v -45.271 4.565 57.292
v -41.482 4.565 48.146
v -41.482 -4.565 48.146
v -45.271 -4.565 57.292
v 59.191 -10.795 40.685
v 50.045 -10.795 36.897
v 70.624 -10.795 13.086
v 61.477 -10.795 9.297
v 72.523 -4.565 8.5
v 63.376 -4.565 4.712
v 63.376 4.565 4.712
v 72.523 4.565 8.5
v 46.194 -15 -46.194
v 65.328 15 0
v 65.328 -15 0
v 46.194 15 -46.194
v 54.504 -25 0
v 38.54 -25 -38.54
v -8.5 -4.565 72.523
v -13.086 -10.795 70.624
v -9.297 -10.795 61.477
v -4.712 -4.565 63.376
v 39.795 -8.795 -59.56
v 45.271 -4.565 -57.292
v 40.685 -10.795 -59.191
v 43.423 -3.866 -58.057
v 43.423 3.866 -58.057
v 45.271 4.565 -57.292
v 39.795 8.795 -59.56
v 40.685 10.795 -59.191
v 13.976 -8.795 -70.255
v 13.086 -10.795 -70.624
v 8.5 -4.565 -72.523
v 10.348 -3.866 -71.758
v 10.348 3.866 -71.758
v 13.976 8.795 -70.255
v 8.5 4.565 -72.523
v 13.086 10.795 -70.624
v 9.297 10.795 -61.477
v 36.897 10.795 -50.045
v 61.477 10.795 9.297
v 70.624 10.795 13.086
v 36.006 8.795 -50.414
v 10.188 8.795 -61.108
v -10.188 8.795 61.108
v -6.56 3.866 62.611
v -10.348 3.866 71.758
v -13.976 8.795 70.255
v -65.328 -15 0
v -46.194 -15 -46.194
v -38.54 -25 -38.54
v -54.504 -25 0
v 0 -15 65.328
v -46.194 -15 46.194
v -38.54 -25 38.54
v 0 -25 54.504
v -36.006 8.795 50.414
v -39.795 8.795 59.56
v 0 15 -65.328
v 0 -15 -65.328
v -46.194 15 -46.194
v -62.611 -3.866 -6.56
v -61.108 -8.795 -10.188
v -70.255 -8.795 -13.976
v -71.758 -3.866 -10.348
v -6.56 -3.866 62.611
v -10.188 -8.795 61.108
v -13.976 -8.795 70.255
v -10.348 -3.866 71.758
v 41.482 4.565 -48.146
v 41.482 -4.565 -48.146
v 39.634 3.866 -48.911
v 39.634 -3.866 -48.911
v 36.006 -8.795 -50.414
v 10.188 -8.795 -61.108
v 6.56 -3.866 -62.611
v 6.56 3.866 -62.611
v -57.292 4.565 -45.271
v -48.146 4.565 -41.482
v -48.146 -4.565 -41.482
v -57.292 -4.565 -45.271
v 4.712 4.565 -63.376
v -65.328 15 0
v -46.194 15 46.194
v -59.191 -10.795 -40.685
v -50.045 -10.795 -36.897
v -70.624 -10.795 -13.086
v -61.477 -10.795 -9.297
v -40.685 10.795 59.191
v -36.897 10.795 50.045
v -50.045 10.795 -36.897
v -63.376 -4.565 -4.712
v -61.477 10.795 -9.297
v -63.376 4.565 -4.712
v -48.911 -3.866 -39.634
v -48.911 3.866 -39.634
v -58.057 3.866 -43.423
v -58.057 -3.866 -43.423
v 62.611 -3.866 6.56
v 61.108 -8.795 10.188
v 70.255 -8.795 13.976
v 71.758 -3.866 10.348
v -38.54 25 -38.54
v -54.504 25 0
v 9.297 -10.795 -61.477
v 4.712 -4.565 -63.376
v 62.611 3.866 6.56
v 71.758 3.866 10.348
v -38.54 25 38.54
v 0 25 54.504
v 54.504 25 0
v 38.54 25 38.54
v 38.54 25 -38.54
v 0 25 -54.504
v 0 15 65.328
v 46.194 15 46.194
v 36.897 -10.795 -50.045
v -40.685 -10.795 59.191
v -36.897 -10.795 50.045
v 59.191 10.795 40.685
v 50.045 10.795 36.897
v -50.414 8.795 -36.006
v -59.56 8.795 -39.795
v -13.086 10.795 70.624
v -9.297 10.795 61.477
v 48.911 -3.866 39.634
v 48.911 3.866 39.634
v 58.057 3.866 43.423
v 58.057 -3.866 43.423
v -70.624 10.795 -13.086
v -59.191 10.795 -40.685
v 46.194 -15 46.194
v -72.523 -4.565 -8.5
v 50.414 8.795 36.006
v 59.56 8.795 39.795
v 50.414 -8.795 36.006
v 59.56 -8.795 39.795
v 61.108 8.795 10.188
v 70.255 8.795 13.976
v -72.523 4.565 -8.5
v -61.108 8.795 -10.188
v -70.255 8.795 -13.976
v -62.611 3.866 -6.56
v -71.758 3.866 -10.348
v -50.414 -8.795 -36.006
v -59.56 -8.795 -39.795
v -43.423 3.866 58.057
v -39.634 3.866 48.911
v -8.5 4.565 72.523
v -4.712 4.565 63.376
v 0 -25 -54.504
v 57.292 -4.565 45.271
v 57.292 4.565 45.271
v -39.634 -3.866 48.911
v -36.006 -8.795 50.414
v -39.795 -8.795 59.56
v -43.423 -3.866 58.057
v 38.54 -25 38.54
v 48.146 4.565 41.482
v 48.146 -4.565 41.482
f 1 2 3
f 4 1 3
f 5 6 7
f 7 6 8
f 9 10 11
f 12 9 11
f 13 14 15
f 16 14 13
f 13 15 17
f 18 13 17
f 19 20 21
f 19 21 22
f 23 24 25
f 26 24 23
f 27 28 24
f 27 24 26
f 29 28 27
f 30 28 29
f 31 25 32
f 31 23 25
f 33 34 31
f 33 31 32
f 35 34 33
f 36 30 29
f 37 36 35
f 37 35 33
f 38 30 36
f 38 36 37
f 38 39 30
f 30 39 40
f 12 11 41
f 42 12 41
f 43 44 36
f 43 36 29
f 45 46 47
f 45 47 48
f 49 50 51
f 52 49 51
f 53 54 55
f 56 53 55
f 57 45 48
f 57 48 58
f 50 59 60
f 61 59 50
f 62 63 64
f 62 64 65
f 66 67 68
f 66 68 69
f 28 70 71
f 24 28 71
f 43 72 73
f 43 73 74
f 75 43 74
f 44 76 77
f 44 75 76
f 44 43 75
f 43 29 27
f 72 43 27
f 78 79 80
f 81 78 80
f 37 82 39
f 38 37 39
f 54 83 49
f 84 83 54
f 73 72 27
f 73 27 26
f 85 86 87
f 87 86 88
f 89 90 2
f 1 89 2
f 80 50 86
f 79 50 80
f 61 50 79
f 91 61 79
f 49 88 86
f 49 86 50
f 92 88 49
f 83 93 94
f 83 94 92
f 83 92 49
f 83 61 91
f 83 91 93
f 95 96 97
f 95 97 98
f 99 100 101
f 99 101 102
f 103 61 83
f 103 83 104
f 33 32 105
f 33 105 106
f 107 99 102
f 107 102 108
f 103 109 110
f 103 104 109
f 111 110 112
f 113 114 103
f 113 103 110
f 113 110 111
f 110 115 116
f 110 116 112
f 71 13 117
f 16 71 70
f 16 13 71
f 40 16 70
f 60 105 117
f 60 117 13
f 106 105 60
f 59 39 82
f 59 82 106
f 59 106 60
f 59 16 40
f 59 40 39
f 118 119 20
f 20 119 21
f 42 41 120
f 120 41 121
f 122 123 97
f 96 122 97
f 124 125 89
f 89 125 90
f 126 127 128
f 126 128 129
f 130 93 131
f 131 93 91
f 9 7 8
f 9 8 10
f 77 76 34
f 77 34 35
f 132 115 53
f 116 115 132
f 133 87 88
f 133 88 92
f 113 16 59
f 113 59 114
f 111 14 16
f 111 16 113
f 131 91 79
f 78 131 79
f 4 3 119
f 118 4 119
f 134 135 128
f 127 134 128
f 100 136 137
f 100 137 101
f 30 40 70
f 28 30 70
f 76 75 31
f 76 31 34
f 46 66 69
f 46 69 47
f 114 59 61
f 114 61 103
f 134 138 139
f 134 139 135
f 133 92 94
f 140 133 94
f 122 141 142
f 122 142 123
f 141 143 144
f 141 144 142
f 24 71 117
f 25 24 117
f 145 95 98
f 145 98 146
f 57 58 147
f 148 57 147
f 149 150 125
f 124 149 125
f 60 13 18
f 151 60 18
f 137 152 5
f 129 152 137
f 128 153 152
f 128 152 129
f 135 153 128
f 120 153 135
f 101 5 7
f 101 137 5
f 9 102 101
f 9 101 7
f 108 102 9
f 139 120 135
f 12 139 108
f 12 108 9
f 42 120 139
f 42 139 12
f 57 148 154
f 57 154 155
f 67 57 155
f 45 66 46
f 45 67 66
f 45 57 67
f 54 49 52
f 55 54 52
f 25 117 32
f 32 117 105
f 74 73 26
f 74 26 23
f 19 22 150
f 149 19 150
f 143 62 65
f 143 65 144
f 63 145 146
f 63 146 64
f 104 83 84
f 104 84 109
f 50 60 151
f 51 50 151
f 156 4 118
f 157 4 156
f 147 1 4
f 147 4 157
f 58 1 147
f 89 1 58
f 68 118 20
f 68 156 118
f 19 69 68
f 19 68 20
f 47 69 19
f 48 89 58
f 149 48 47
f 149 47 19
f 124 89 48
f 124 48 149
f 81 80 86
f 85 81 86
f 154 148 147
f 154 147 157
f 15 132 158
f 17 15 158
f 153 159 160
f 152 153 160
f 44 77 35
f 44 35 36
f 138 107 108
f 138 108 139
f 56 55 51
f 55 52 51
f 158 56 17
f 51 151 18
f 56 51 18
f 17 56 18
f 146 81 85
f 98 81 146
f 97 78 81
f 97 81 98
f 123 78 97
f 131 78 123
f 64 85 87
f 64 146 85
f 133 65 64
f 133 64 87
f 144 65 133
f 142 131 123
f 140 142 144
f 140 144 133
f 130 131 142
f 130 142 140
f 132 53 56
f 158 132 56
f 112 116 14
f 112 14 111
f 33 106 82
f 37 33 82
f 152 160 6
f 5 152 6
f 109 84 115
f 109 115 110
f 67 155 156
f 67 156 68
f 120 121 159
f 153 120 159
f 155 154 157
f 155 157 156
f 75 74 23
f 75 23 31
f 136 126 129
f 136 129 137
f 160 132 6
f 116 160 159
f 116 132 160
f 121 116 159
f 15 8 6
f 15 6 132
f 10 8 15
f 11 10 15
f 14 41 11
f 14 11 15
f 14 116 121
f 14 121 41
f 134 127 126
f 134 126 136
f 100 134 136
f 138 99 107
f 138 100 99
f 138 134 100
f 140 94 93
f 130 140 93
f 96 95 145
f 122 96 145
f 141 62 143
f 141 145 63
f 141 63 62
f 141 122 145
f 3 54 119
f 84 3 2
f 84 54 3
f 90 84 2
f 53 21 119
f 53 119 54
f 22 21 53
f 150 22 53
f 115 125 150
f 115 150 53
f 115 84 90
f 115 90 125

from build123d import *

# Parameters (mm, degrees)
EXTRUDE_1_DEPTH          = 25
CUT_EXTRUDE_1_DEPTH      = 153.008558041
PATTERN_CIRCULAR_1_COUNT = 8
EXTRUDE_1_2_DEPTH        = 9.9
PATTERN_CIRCULAR_2_COUNT = 4


with BuildPart() as part:
    # 草图1 → Extrude 1 (new, symmetric)
    with BuildSketch(Plane(origin=(0, 0, 0), x_dir=(1, 0, 0), z_dir=(0, 1, 0))):
        Polygon((0, -65.328148244), (46.193976626, -46.193976626), (65.328148244, 0), (46.193976626, 46.193976626), (0, 65.328148244), (-46.193976626, 46.193976626), (-65.328148244, 0), (-46.193976626, -46.193976626), align=None)
    extrude(amount=EXTRUDE_1_DEPTH, both=True)

    # 草图2 → 切除-拉伸1 (cut, through all)
    with BuildSketch(Plane(origin=(55.761062435, 0, 23.096988313), x_dir=(0.38268343236508157, 0, -0.9238795325112902), z_dir=(0.9238795325112902, 0, 0.38268343236508157))):
        Polygon((-60.355339059, 25), (-60.355339059, 15), (-50.355339059, 25), align=None)
        Polygon((-60.355339059, -25), (-60.355339059, -15), (-50.355339059, -25), align=None)
    cut_extrude_1 = extrude(amount=-CUT_EXTRUDE_1_DEPTH, mode=Mode.SUBTRACT)

    # 阵列(圆周)1: 切除-拉伸1 ×8 about axis
    pattern_circular_1_axis = Axis((0, -27.5, 0), (0, 1, 0))
    for i in range(1, PATTERN_CIRCULAR_1_COUNT):
        add(cut_extrude_1.rotate(pattern_circular_1_axis, i * 360 / PATTERN_CIRCULAR_1_COUNT), mode=Mode.SUBTRACT)

    # 草图3 → Extrude 1 2 (add)
    with BuildSketch(Plane(origin=(-55.761062435, 0, -23.096988313), x_dir=(-0.3826834323650816, 0, 0.9238795325112902), z_dir=(-0.9238795325112902, 0, -0.3826834323650816))):
        Polygon((19.9, 4.565036261), (14.936812049, 10.795), (-14.936812049, 10.795), (-19.9, 4.565036261), (-19.9, -4.565036261), (-14.936812049, -10.795), (14.936812049, -10.795), (19.9, -4.565036261), align=None)
        Polygon((17.9, 3.865761475), (13.973053026, 8.795), (-13.973053026, 8.795), (-17.9, 3.865761475), (-17.9, -3.865761475), (-13.973053026, -8.795), (13.973053026, -8.795), (17.9, -3.865761475), align=None, mode=Mode.SUBTRACT)
    extrude_1_2 = extrude(amount=EXTRUDE_1_2_DEPTH)

    # 阵列(圆周)2: Extrude 1 2 ×4 about axis
    pattern_circular_2_axis = Axis((0, -27.5, 0), (0, 1, 0))
    for i in range(1, PATTERN_CIRCULAR_2_COUNT):
        add(extrude_1_2.rotate(pattern_circular_2_axis, i * 360 / PATTERN_CIRCULAR_2_COUNT))


solid = part.part
